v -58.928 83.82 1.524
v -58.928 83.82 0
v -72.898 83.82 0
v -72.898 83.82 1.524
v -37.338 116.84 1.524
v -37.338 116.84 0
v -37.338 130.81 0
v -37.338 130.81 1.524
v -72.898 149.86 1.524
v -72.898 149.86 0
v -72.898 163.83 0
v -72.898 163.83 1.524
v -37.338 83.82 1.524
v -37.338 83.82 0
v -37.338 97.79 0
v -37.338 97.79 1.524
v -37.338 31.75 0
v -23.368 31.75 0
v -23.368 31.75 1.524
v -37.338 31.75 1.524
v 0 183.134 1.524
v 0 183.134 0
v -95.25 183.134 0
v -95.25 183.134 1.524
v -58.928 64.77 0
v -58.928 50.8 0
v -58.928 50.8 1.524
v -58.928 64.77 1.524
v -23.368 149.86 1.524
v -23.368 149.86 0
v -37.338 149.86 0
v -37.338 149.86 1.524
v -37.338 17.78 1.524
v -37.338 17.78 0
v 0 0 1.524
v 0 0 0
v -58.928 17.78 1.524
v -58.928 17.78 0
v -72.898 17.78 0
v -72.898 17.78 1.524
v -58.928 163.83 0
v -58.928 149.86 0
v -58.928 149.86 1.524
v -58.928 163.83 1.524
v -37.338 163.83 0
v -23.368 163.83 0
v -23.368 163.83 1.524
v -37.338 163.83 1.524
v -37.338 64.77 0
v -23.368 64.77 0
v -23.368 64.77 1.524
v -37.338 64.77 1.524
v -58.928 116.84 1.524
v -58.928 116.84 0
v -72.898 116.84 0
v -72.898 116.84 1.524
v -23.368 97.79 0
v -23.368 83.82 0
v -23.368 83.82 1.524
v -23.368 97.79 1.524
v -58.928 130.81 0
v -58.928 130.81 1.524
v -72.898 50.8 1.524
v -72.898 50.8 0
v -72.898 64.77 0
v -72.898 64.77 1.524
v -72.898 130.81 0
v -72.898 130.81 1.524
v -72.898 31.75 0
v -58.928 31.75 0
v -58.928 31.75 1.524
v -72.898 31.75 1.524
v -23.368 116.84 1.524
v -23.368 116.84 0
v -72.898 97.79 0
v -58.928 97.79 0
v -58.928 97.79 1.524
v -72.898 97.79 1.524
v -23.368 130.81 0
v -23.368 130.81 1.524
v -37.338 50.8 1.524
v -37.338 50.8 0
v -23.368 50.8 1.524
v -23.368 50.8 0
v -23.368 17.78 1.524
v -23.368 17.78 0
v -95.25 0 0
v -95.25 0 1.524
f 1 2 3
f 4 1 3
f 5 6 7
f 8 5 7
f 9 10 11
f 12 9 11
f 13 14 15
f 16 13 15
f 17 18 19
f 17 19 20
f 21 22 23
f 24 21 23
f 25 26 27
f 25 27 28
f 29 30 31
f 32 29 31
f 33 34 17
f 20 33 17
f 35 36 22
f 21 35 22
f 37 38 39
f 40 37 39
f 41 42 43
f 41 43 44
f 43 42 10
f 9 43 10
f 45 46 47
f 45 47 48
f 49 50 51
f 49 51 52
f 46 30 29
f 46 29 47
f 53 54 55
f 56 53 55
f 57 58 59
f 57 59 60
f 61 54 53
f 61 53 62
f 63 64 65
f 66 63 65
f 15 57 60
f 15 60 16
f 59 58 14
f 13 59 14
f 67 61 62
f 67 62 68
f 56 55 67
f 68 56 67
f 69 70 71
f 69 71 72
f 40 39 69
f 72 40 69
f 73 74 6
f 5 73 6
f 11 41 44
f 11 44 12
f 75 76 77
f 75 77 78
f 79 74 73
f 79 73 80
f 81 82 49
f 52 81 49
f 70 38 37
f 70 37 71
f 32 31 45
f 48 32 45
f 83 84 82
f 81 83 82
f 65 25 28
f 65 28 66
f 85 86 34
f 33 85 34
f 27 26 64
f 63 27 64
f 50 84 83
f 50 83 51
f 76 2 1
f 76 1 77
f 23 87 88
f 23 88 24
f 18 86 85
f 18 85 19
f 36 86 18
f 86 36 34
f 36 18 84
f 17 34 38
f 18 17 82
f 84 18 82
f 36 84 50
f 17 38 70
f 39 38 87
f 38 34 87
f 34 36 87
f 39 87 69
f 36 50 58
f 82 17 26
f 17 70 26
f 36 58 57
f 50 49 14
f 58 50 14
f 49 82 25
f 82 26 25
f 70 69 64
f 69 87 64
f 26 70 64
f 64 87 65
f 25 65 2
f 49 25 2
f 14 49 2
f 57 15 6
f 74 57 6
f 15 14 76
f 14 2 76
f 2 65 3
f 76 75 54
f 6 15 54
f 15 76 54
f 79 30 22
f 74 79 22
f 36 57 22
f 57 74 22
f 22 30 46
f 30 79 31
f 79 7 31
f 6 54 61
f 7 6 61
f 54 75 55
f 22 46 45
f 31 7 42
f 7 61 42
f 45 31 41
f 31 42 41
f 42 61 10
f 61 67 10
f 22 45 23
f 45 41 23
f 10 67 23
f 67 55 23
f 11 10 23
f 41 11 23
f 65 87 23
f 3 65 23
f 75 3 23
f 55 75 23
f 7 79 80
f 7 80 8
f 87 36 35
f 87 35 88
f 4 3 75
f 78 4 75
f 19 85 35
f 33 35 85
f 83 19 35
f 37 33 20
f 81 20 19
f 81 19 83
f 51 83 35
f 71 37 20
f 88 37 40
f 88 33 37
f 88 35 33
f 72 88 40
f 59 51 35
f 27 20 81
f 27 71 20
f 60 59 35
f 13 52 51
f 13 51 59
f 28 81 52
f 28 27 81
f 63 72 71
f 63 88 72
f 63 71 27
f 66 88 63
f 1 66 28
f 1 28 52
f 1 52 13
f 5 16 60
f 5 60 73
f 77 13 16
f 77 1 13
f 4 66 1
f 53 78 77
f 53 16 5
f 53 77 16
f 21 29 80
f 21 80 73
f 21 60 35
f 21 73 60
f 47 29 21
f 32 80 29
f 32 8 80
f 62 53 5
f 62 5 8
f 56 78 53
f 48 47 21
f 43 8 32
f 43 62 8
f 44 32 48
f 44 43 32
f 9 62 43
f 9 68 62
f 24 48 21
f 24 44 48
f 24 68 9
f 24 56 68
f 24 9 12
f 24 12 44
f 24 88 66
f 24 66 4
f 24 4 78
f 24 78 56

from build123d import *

# Parameters (mm, degrees)
SKETCH1_W           = 183.134
SKETCH1_H           = 95.25
SKETCH1_W_2         = 13.97
SKETCH1_H_2         = 13.97
BOSS_EXTRUDE1_DEPTH = 1.524


with BuildPart() as part:
    # Sketch1 → Boss-Extrude1 (new body)
    with BuildSketch(Plane(origin=(0, 0, 0), x_dir=(0, 1, 0), z_dir=(0, 0, 1))):
        with Locations((91.567, 47.625)):
            Rectangle(SKETCH1_W, SKETCH1_H)
        with Locations((24.765, 65.913)):
            Rectangle(SKETCH1_W_2, SKETCH1_H_2, mode=Mode.SUBTRACT)
        with Locations((57.785, 65.913)):
            Rectangle(SKETCH1_W_2, SKETCH1_H_2, mode=Mode.SUBTRACT)
        with Locations((90.805, 65.913)):
            Rectangle(SKETCH1_W_2, SKETCH1_H_2, mode=Mode.SUBTRACT)
        with Locations((123.825, 65.913)):
            Rectangle(SKETCH1_W_2, SKETCH1_H_2, mode=Mode.SUBTRACT)
        with Locations((156.845, 65.913)):
            Rectangle(SKETCH1_W_2, SKETCH1_H_2, mode=Mode.SUBTRACT)
        with Locations((57.785, 30.353)):
            Rectangle(SKETCH1_W_2, SKETCH1_H_2, mode=Mode.SUBTRACT)
        with Locations((90.805, 30.353)):
            Rectangle(SKETCH1_W_2, SKETCH1_H_2, mode=Mode.SUBTRACT)
        with Locations((123.825, 30.353)):
            Rectangle(SKETCH1_W_2, SKETCH1_H_2, mode=Mode.SUBTRACT)
        with Locations((156.845, 30.353)):
            Rectangle(SKETCH1_W_2, SKETCH1_H_2, mode=Mode.SUBTRACT)
        with Locations((24.765, 30.353)):
            Rectangle(SKETCH1_W_2, SKETCH1_H_2, mode=Mode.SUBTRACT)
    extrude(amount=BOSS_EXTRUDE1_DEPTH)


solid = part.part
